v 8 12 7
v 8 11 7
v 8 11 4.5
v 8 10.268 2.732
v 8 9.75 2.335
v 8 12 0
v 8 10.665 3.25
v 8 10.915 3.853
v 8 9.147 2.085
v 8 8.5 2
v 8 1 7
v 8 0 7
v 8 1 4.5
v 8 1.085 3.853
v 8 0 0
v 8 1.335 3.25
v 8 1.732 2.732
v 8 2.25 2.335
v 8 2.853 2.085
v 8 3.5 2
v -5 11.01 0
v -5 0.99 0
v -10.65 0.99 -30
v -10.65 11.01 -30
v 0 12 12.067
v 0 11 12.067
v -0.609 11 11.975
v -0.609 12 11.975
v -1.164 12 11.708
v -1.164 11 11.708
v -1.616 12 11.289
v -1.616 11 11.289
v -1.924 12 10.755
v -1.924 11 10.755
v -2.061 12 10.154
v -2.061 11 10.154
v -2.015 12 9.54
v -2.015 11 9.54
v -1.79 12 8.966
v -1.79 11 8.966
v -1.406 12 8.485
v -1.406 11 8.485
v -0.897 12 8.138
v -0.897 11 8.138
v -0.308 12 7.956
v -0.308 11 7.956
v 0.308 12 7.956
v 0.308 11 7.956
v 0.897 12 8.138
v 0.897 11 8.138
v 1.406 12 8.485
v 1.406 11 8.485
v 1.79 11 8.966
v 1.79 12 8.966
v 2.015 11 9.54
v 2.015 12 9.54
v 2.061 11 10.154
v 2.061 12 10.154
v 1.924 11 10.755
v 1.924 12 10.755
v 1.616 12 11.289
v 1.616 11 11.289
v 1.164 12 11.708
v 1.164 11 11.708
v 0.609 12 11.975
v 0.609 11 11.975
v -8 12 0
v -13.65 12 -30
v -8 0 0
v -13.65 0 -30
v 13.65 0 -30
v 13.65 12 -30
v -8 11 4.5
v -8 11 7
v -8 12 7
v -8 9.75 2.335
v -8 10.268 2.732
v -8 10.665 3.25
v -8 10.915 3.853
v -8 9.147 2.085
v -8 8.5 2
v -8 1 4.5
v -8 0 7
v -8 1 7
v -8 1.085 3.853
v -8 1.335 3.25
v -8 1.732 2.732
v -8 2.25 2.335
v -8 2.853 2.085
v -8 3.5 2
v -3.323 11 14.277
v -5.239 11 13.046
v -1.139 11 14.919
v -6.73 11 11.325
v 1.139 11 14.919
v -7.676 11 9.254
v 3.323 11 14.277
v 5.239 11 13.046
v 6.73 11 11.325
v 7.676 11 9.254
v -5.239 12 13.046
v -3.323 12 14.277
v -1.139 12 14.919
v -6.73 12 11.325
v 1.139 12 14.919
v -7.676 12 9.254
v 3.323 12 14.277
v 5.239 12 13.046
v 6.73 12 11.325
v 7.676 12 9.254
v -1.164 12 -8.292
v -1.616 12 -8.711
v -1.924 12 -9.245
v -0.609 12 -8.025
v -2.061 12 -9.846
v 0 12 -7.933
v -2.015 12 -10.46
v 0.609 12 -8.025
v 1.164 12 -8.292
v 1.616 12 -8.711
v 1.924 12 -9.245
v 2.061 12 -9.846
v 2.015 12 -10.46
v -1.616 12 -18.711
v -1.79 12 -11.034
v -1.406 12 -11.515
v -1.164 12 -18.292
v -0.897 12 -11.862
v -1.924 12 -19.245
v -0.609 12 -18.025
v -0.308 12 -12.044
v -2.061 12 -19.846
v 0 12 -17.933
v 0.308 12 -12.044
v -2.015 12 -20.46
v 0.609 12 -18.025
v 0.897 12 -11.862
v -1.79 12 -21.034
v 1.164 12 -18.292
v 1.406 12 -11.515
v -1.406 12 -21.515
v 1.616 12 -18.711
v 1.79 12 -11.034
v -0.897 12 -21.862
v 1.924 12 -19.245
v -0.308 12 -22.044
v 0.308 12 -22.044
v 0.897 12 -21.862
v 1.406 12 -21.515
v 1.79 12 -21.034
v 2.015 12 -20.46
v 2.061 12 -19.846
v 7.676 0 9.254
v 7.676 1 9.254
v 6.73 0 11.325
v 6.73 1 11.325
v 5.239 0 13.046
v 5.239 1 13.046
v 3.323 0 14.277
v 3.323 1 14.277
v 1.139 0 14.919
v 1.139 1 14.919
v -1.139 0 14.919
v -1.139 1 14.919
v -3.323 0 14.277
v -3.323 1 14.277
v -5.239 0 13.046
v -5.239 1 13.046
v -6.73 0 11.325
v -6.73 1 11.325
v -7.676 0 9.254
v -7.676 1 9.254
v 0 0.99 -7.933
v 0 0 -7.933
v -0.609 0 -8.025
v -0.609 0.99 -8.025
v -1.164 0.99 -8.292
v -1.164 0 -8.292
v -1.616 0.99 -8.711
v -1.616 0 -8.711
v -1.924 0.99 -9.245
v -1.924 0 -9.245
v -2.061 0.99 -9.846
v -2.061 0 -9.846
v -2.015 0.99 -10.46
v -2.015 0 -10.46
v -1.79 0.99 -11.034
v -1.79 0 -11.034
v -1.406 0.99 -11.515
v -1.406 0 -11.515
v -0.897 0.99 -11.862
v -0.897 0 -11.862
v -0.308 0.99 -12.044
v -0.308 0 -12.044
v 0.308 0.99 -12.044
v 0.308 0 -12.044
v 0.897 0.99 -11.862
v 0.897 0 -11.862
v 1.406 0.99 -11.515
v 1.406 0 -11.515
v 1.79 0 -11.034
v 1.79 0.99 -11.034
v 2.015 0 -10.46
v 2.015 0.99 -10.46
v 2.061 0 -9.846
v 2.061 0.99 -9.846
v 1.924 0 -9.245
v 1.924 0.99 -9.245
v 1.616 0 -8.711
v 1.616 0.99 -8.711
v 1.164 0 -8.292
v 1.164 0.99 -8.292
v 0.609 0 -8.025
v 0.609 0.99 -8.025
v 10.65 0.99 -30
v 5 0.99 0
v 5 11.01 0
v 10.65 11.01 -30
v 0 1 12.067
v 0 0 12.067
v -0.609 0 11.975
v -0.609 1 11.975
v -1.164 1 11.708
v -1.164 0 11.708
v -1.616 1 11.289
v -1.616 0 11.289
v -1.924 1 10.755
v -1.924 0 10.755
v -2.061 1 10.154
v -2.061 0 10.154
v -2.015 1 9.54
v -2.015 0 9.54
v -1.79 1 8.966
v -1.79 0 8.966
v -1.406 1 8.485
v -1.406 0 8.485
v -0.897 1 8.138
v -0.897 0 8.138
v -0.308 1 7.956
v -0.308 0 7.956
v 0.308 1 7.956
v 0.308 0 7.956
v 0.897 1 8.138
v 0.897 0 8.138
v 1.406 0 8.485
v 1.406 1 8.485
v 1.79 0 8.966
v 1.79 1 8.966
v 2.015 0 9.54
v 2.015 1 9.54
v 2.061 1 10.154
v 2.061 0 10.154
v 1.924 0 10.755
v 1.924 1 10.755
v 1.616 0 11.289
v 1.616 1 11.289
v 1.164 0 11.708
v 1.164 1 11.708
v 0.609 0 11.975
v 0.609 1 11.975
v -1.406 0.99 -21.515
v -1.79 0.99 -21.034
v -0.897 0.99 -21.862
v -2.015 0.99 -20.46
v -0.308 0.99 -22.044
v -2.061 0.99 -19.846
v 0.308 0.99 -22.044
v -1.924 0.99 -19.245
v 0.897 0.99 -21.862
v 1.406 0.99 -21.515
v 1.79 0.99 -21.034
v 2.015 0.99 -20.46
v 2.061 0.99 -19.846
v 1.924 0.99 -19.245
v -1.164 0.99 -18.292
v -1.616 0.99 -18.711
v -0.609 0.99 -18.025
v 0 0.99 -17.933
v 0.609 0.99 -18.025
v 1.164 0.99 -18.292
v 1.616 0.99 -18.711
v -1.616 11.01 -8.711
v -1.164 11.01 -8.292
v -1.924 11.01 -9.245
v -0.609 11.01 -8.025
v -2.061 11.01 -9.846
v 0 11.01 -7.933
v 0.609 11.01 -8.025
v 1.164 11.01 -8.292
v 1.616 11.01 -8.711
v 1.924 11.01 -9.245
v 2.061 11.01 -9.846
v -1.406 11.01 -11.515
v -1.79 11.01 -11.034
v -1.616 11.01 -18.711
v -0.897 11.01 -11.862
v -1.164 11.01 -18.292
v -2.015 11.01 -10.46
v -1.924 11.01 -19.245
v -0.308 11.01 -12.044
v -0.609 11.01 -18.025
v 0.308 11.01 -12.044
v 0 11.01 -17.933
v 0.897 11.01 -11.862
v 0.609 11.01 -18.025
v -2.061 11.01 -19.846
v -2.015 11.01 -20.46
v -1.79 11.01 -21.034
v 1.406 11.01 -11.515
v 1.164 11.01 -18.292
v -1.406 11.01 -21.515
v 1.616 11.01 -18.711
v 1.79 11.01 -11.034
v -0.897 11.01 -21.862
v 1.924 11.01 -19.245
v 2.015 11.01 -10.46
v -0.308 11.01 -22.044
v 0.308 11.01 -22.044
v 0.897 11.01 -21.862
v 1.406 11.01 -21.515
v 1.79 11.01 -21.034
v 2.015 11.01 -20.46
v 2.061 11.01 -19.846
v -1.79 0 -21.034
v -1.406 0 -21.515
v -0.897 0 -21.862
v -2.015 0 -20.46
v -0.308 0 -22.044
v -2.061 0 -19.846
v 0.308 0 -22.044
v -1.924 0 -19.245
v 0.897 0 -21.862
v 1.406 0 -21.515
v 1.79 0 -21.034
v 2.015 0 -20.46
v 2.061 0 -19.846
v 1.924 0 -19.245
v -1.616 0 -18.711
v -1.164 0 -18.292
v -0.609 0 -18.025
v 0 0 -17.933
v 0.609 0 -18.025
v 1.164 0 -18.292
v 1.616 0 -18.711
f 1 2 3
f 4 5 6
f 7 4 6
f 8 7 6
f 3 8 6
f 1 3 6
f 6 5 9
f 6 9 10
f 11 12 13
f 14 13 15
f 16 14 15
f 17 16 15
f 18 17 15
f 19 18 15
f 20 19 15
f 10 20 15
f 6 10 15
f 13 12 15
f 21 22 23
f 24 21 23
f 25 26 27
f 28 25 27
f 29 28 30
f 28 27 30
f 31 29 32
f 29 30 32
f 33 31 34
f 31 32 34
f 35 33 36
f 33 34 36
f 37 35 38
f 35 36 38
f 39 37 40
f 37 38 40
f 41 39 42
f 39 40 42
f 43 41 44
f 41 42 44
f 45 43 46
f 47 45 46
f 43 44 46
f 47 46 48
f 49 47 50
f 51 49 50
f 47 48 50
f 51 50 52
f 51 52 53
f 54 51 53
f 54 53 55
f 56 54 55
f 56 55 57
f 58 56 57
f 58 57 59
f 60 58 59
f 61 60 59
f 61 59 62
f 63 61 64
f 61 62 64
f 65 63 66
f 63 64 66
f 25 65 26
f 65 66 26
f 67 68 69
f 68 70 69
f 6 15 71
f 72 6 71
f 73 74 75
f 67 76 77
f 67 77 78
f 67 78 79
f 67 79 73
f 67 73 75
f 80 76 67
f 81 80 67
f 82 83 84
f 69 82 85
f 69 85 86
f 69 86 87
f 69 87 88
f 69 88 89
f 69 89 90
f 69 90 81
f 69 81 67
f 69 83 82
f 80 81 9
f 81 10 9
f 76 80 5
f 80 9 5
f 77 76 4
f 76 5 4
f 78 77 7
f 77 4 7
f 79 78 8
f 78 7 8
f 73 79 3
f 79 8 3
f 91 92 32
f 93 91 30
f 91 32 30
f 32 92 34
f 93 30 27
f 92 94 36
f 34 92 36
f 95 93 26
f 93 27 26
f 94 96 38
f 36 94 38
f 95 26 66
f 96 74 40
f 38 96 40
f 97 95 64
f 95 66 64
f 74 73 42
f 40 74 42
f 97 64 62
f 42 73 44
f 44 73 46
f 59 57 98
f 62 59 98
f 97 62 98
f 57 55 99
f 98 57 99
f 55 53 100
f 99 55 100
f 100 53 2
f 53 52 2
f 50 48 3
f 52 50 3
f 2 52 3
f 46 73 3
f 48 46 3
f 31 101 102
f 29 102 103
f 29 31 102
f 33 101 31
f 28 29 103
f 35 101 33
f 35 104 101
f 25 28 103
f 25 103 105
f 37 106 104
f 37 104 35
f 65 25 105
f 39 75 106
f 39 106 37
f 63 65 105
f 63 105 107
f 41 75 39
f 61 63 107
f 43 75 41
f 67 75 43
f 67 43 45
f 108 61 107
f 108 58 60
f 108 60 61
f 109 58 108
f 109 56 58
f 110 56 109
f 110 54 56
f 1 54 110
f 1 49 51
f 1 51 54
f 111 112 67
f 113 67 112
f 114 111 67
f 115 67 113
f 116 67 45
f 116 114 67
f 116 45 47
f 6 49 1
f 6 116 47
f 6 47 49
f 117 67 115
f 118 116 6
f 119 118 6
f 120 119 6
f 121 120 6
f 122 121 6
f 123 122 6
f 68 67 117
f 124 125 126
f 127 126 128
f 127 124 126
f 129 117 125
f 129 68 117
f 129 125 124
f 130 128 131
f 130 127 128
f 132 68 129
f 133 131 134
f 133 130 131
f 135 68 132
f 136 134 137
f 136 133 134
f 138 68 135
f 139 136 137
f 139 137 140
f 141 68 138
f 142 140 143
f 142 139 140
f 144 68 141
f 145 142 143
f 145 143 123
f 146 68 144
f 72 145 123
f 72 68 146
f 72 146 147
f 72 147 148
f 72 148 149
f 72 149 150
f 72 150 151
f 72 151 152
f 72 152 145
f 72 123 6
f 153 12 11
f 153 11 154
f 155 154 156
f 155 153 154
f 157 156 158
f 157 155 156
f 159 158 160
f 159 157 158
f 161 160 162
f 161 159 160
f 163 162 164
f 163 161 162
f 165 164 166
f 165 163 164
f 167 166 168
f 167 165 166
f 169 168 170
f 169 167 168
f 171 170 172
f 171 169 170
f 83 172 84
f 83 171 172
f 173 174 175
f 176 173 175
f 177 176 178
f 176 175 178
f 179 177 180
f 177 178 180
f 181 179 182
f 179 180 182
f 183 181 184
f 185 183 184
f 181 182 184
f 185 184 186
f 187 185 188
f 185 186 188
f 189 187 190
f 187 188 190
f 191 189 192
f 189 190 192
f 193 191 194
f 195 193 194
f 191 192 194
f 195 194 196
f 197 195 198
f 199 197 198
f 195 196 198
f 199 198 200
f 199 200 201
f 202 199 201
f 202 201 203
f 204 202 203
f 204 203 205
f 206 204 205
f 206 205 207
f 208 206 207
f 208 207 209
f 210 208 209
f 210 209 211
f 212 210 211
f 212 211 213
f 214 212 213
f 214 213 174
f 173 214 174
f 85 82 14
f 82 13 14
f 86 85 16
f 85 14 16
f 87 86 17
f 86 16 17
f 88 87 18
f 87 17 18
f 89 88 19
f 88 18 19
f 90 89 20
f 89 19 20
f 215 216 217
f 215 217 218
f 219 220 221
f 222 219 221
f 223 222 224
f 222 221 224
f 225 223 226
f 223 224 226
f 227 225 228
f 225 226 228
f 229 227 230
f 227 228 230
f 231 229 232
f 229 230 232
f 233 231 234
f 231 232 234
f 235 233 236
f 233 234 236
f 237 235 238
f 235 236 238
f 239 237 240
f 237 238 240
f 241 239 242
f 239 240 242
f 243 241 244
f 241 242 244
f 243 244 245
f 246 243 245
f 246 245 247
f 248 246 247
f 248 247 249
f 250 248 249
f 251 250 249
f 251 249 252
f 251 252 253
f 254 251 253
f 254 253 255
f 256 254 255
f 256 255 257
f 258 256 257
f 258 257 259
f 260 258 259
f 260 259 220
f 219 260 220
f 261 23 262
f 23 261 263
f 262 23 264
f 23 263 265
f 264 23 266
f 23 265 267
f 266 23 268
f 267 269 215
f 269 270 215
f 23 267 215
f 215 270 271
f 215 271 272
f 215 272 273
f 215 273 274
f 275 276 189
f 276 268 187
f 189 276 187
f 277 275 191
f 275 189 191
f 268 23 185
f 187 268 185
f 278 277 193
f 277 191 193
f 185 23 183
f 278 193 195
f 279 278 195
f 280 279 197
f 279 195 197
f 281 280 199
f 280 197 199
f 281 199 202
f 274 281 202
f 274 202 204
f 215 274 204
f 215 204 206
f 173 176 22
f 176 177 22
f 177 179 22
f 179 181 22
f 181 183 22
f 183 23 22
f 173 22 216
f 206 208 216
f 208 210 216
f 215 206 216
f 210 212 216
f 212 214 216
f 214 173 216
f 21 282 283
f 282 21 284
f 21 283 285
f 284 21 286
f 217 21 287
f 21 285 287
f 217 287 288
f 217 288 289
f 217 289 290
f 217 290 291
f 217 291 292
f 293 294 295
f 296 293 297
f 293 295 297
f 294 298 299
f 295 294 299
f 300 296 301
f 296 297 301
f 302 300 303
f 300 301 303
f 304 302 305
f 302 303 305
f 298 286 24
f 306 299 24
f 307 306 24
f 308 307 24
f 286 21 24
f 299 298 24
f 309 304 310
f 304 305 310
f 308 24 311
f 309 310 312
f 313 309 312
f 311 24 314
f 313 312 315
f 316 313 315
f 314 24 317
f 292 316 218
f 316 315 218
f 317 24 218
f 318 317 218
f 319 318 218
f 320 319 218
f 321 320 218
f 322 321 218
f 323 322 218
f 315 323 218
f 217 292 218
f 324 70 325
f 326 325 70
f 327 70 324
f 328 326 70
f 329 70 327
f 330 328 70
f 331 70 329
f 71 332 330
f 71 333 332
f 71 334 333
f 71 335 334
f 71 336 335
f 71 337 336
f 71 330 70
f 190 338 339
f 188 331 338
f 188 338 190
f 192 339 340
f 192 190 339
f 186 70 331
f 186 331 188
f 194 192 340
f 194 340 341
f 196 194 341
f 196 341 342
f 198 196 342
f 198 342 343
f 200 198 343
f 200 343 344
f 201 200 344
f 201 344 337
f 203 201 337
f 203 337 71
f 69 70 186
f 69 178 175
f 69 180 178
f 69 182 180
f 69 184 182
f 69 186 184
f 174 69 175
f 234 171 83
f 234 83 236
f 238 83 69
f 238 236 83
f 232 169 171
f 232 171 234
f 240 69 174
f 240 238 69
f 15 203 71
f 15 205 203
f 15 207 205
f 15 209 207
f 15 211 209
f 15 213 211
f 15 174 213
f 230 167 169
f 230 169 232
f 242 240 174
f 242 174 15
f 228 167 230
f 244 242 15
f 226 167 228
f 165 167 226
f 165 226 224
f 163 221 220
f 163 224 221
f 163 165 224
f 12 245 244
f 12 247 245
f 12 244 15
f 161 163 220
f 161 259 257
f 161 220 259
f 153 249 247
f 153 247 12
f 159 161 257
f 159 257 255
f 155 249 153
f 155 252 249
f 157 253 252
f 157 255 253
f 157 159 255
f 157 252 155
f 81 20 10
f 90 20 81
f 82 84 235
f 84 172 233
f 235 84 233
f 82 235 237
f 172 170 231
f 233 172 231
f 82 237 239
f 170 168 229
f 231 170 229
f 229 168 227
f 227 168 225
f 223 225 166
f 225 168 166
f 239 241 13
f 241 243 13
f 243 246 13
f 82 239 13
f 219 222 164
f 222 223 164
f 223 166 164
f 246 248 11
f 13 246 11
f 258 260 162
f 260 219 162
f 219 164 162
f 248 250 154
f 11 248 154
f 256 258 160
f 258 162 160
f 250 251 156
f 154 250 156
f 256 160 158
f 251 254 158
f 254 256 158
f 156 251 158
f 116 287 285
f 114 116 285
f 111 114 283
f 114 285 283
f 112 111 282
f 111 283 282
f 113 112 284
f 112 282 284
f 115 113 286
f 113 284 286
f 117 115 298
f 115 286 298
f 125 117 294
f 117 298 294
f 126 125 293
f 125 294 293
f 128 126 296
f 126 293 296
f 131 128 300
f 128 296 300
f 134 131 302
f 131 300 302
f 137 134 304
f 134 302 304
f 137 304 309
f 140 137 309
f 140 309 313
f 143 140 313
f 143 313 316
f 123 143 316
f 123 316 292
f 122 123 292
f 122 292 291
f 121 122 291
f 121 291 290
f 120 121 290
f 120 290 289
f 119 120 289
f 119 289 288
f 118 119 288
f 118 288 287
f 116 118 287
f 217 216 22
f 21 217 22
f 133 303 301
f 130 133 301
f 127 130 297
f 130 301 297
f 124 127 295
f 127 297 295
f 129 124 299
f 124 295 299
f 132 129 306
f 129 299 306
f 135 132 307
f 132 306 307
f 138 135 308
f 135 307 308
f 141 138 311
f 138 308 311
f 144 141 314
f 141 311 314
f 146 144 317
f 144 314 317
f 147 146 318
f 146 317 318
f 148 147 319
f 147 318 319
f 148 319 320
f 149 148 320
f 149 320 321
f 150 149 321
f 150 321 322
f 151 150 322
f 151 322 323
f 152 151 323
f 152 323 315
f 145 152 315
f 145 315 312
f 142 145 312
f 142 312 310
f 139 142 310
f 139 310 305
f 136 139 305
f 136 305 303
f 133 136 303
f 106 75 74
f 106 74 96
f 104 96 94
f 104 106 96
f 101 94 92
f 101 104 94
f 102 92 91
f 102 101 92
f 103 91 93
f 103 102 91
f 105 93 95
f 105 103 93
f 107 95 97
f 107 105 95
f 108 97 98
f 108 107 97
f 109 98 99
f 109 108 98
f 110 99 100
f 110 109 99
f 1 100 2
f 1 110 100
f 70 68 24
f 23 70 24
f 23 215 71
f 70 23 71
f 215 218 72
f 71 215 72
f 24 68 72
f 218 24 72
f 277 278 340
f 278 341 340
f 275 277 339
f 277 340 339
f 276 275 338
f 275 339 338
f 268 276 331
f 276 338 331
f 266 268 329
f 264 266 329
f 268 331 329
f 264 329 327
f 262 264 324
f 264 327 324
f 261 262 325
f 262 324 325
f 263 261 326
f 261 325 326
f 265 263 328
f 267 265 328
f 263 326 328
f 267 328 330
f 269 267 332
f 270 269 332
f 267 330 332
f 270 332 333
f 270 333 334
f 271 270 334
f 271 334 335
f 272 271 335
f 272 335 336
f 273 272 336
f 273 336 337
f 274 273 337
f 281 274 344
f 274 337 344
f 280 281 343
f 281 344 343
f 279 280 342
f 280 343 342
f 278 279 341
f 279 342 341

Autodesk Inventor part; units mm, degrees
ref_plane "YZ Plane" through (0, 0, 0) normal (1, 0, 0) x (0, 1, 0)
ref_plane "XZ Plane" through (0, 0, 0) normal (0, 1, 0) x (-1, 0, 0)
ref_plane "XY Plane" through (0, 0, 0) normal (0, 0, 1) x (1, 0, 0)
sketch "Esquisse1" plane through (0, 0, 0) normal (0, 1, 0) x (-1, 0, 0)
  line L0 (0, 0) -> (0, -30)
  line L1 (0, -30) -> (10.6495, -30)
  line L2 (0, -30) -> (10.6495, -30) construction
  line L3 (0, -30) -> (-10.6495, -30)
  line L4 (0, 0) -> (5, 0)
  line L5 (0, 0) -> (-5, 0)
  line L6 (-5, 0) -> (-10.6495, -30)
  line L7 (5, 0) -> (10.6495, -30)
  line L8 (5, 0) -> (8, 0)
  line L9 (10.6495, -30) -> (13.6495, -30)
  line L10 (13.6495, -30) -> (8, 0)
  line L11 (-10.6495, -30) -> (-13.6495, -30)
  line L12 (-5, 0) -> (-8, 0)
  line L13 (-8, 0) -> (-13.6495, -30)
  line L14 (0, 0) -> (0, 2)
  line L15 (0, 2) -> (8, 2)
  line L16 (8, 2) -> (8, 0)
  line L17 (0, 2) -> (-8, 2)
  line L18 (-8, 2) -> (-8, 0)
  dimension "d0" = 30
  dimension "d1" = 10.6495
  dimension "d2" = 0
  dimension "d3" = 10.6495
  dimension "d4" = 5
  dimension "d5" = 5
  dimension "d7" = 3
  dimension "d8" = 3
  dimension "d9" = 3
  dimension "d10" = 3
  dimension "d11" = 2
extrude "Extrusion1" add sketch "Esquisse1" along normal blind 12 contours L14 L15 L16 L8 L4 | L5 L12 L18 L17 L14 | L8 L10 L9 L7 | L6 L11 L13 L12
sketch "Esquisse2" plane through (0, 0, 0) normal (0, -1, 0) x (1, 0, 0)
  line L0 (-5, 0) -> (-10.6495, -30) projected
  line L1 (-5, 0) -> (-10.6495, -30)
  line L2 (10.6495, -30) -> (5, 0) projected
  line L3 (-10.6495, -30) -> (10.6495, -30)
  line L4 (10.6495, -30) -> (5, 0)
  line L5 (5, 0) -> (-5, 0)
  point P0 (0, 0)
extrude "Extrusion2" add sketch "Esquisse2" against normal blind 0.99
sketch "Esquisse3" plane through (0, 12, 0) normal (0, 1, 0) x (1, 0, 0)
  line L0 (5, 0) -> (-5, 0) projected
  line L1 (5, 0) -> (-5, 0)
  line L2 (-10.6495, 30) -> (-13.6495, 30) projected
  line L3 (-5, 0) -> (-10.6495, 30)
  line L4 (10.6495, 30) -> (5, 0) projected
  line L5 (-10.6495, 30) -> (10.6495, 30)
  line L6 (10.6495, 30) -> (5, 0)
  point P0 (0, 0)
extrude "Extrusion3" add sketch "Esquisse3" against normal blind 0.99
sketch "Esquisse4" plane through (0, 12, 0) normal (0, 1, 0) x (1, 0, 0)
  line L0 (0, 0) -> (0, 30)
  line L1 (13.6495, 30) -> (-13.6495, 30) projected
  line L2 (0, 0) -> (0, 10)
  line L3 (0, 10) -> (0, 20)
  dimension "d18" = 10
  dimension "d19" = 10
hole "Perçage1" at (0, 12, -10) at (0, 12, -20) direction (0, -1, 0) diameter 4.134 end through all thread size "M5x0.8" class "6H" standard "ISO Metric profile"
sketch "Esquisse5" plane through (0, 12, 0) normal (0, 1, 0) x (1, 0, 0)
  line L0 (-8, -2) -> (8, -2) projected
  line L1 (-8, -2) -> (-8, -7)
  line L2 (-8, -7) -> (8, -7)
  line L3 (8, -7) -> (8, -2)
  arc A0 (-8, -7) -> (8, -7) centre (0, -7) ccw
  point P0 (0, 0)
  dimension "d27" = 5
extrude "Extrusion4" add sketch "Esquisse5" against normal blind 1
fillet "Congé1" radius 2.5 1 edges at (0, 11, 2)
sketch "Esquisse7" plane through (0, 12, 0) normal (0, 1, 0) x (1, 0, 0)
  line L0 (0, 0) -> (0, -10)
  dimension "d31" = 10
sketch "Esquisse8" plane through (0, 0, 0) normal (0, -1, 0) x (1, 0, 0)
  line L0 (-8, 2) -> (8, 2) projected
  line L1 (-8, 7) -> (-8, 2)
  line L2 (8, 7) -> (8, 0) projected
  line L3 (8, 2) -> (8, 7)
  line L4 (-8, 2) -> (8, 2)
  arc A0 (8, 7) -> (-8, 7) centre (0, 7) ccw
  point P0 (0, 0)
extrude "Extrusion5" add sketch "Esquisse8" against normal blind 1
fillet "Congé2" radius 2.5 1 edges at (0, 1, 2)
hole "Perçage2" at (0, 12, 10) direction (0, -1, 0) diameter 4.134 end through all thread size "M5x0.8" class "6H" standard "ISO Metric profile"
properties part number "Fixation_rotule_axe_centrale"
